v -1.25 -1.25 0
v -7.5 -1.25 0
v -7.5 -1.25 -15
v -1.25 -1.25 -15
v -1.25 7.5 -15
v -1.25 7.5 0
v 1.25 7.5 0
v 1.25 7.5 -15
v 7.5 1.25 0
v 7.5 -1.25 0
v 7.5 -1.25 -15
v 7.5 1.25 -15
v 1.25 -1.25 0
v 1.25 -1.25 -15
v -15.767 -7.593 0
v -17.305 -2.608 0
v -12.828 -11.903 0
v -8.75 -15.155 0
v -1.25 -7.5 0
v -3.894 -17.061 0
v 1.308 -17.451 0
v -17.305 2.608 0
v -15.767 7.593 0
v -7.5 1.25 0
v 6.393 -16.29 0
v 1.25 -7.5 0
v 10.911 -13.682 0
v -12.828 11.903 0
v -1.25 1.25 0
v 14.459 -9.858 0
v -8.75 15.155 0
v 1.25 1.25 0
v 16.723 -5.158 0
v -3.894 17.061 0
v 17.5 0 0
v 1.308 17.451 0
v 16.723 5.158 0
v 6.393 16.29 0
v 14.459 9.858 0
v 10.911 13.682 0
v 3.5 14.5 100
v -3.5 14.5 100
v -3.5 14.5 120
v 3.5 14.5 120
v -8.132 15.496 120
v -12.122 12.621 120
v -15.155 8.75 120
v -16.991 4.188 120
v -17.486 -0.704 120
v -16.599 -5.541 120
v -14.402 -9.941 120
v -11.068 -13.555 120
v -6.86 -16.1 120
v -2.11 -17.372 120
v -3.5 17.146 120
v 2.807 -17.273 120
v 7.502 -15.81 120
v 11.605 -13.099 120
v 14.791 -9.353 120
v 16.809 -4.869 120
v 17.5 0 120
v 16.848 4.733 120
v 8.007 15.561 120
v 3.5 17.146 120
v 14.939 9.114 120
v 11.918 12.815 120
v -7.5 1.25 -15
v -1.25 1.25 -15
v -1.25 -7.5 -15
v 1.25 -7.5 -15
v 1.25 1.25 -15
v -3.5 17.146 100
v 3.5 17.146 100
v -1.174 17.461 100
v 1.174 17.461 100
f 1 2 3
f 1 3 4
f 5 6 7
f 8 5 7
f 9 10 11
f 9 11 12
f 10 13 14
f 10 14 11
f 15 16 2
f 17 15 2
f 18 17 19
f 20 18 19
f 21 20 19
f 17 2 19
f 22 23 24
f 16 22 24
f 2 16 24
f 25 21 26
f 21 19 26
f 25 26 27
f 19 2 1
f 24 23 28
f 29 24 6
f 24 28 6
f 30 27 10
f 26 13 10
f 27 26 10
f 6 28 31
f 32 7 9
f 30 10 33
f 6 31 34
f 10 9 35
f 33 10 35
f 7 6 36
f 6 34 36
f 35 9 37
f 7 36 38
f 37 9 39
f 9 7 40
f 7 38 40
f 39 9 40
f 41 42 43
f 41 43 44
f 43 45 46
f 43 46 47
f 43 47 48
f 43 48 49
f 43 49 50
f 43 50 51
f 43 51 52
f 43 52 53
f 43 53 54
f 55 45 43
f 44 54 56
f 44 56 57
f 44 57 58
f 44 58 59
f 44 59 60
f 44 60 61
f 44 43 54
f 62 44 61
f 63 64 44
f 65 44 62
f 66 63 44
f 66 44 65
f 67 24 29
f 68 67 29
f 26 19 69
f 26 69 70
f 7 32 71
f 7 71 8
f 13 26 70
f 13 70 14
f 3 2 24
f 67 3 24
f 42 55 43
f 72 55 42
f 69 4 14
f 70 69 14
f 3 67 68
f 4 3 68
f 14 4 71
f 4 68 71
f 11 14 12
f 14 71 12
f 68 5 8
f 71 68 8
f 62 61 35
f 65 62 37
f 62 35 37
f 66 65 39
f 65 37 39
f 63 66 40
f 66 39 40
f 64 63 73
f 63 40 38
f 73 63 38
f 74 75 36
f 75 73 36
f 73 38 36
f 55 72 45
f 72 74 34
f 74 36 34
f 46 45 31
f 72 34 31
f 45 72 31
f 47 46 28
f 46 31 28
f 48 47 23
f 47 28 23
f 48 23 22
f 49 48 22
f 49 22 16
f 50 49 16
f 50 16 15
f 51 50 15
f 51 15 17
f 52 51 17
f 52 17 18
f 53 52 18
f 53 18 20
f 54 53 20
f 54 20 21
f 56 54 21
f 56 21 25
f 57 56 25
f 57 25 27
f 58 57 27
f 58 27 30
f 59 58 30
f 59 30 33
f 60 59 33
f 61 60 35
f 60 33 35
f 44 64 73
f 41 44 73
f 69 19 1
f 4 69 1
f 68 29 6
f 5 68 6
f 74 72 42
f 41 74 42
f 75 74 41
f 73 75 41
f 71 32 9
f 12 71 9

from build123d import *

# Parameters (mm, degrees)
SKETCH_1_W          = 2.5
SKETCH_1_H          = 6.25
SKETCH_1_W_2        = 6.25
SKETCH_1_H_2        = 2.5
EXTRUDE_1_DEPTH     = 15
SKETCH_2_R          = 17.5
EXTRUDE_2_DEPTH     = 120
SKETCH_3_W          = 7
SKETCH_3_H          = 20
CUT_EXTRUDE_1_DEPTH = 3


with BuildPart() as part:
    # 草图1 → 凸台-拉伸1 (new body)
    with BuildSketch(Plane.XY):
        with Locations((0, 4.375)):
            Rectangle(SKETCH_1_W, SKETCH_1_H)
        with Locations((-4.375, 0)):
            Rectangle(SKETCH_1_W_2, SKETCH_1_H_2)
        with Locations((4.375, 0)):
            Rectangle(SKETCH_1_W_2, SKETCH_1_H_2)
        with Locations((0, -4.375)):
            Rectangle(SKETCH_1_W, SKETCH_1_H)
        Rectangle(SKETCH_1_W, SKETCH_1_H_2)
    extrude(amount=-EXTRUDE_1_DEPTH)

    # 草图2 → 凸台-拉伸2 (add)
    with BuildSketch(Plane.XY):
        Circle(SKETCH_2_R)
    extrude(amount=EXTRUDE_2_DEPTH)

    # 草图3 → 切除-拉伸1 (cut)
    with BuildSketch(Plane(origin=(0, 17.5, 0), x_dir=(1, 0, 0), z_dir=(0, 1, 0))):
        with Locations((0, -110)):
            Rectangle(SKETCH_3_W, SKETCH_3_H)
    extrude(amount=-CUT_EXTRUDE_1_DEPTH, mode=Mode.SUBTRACT)


solid = part.part
